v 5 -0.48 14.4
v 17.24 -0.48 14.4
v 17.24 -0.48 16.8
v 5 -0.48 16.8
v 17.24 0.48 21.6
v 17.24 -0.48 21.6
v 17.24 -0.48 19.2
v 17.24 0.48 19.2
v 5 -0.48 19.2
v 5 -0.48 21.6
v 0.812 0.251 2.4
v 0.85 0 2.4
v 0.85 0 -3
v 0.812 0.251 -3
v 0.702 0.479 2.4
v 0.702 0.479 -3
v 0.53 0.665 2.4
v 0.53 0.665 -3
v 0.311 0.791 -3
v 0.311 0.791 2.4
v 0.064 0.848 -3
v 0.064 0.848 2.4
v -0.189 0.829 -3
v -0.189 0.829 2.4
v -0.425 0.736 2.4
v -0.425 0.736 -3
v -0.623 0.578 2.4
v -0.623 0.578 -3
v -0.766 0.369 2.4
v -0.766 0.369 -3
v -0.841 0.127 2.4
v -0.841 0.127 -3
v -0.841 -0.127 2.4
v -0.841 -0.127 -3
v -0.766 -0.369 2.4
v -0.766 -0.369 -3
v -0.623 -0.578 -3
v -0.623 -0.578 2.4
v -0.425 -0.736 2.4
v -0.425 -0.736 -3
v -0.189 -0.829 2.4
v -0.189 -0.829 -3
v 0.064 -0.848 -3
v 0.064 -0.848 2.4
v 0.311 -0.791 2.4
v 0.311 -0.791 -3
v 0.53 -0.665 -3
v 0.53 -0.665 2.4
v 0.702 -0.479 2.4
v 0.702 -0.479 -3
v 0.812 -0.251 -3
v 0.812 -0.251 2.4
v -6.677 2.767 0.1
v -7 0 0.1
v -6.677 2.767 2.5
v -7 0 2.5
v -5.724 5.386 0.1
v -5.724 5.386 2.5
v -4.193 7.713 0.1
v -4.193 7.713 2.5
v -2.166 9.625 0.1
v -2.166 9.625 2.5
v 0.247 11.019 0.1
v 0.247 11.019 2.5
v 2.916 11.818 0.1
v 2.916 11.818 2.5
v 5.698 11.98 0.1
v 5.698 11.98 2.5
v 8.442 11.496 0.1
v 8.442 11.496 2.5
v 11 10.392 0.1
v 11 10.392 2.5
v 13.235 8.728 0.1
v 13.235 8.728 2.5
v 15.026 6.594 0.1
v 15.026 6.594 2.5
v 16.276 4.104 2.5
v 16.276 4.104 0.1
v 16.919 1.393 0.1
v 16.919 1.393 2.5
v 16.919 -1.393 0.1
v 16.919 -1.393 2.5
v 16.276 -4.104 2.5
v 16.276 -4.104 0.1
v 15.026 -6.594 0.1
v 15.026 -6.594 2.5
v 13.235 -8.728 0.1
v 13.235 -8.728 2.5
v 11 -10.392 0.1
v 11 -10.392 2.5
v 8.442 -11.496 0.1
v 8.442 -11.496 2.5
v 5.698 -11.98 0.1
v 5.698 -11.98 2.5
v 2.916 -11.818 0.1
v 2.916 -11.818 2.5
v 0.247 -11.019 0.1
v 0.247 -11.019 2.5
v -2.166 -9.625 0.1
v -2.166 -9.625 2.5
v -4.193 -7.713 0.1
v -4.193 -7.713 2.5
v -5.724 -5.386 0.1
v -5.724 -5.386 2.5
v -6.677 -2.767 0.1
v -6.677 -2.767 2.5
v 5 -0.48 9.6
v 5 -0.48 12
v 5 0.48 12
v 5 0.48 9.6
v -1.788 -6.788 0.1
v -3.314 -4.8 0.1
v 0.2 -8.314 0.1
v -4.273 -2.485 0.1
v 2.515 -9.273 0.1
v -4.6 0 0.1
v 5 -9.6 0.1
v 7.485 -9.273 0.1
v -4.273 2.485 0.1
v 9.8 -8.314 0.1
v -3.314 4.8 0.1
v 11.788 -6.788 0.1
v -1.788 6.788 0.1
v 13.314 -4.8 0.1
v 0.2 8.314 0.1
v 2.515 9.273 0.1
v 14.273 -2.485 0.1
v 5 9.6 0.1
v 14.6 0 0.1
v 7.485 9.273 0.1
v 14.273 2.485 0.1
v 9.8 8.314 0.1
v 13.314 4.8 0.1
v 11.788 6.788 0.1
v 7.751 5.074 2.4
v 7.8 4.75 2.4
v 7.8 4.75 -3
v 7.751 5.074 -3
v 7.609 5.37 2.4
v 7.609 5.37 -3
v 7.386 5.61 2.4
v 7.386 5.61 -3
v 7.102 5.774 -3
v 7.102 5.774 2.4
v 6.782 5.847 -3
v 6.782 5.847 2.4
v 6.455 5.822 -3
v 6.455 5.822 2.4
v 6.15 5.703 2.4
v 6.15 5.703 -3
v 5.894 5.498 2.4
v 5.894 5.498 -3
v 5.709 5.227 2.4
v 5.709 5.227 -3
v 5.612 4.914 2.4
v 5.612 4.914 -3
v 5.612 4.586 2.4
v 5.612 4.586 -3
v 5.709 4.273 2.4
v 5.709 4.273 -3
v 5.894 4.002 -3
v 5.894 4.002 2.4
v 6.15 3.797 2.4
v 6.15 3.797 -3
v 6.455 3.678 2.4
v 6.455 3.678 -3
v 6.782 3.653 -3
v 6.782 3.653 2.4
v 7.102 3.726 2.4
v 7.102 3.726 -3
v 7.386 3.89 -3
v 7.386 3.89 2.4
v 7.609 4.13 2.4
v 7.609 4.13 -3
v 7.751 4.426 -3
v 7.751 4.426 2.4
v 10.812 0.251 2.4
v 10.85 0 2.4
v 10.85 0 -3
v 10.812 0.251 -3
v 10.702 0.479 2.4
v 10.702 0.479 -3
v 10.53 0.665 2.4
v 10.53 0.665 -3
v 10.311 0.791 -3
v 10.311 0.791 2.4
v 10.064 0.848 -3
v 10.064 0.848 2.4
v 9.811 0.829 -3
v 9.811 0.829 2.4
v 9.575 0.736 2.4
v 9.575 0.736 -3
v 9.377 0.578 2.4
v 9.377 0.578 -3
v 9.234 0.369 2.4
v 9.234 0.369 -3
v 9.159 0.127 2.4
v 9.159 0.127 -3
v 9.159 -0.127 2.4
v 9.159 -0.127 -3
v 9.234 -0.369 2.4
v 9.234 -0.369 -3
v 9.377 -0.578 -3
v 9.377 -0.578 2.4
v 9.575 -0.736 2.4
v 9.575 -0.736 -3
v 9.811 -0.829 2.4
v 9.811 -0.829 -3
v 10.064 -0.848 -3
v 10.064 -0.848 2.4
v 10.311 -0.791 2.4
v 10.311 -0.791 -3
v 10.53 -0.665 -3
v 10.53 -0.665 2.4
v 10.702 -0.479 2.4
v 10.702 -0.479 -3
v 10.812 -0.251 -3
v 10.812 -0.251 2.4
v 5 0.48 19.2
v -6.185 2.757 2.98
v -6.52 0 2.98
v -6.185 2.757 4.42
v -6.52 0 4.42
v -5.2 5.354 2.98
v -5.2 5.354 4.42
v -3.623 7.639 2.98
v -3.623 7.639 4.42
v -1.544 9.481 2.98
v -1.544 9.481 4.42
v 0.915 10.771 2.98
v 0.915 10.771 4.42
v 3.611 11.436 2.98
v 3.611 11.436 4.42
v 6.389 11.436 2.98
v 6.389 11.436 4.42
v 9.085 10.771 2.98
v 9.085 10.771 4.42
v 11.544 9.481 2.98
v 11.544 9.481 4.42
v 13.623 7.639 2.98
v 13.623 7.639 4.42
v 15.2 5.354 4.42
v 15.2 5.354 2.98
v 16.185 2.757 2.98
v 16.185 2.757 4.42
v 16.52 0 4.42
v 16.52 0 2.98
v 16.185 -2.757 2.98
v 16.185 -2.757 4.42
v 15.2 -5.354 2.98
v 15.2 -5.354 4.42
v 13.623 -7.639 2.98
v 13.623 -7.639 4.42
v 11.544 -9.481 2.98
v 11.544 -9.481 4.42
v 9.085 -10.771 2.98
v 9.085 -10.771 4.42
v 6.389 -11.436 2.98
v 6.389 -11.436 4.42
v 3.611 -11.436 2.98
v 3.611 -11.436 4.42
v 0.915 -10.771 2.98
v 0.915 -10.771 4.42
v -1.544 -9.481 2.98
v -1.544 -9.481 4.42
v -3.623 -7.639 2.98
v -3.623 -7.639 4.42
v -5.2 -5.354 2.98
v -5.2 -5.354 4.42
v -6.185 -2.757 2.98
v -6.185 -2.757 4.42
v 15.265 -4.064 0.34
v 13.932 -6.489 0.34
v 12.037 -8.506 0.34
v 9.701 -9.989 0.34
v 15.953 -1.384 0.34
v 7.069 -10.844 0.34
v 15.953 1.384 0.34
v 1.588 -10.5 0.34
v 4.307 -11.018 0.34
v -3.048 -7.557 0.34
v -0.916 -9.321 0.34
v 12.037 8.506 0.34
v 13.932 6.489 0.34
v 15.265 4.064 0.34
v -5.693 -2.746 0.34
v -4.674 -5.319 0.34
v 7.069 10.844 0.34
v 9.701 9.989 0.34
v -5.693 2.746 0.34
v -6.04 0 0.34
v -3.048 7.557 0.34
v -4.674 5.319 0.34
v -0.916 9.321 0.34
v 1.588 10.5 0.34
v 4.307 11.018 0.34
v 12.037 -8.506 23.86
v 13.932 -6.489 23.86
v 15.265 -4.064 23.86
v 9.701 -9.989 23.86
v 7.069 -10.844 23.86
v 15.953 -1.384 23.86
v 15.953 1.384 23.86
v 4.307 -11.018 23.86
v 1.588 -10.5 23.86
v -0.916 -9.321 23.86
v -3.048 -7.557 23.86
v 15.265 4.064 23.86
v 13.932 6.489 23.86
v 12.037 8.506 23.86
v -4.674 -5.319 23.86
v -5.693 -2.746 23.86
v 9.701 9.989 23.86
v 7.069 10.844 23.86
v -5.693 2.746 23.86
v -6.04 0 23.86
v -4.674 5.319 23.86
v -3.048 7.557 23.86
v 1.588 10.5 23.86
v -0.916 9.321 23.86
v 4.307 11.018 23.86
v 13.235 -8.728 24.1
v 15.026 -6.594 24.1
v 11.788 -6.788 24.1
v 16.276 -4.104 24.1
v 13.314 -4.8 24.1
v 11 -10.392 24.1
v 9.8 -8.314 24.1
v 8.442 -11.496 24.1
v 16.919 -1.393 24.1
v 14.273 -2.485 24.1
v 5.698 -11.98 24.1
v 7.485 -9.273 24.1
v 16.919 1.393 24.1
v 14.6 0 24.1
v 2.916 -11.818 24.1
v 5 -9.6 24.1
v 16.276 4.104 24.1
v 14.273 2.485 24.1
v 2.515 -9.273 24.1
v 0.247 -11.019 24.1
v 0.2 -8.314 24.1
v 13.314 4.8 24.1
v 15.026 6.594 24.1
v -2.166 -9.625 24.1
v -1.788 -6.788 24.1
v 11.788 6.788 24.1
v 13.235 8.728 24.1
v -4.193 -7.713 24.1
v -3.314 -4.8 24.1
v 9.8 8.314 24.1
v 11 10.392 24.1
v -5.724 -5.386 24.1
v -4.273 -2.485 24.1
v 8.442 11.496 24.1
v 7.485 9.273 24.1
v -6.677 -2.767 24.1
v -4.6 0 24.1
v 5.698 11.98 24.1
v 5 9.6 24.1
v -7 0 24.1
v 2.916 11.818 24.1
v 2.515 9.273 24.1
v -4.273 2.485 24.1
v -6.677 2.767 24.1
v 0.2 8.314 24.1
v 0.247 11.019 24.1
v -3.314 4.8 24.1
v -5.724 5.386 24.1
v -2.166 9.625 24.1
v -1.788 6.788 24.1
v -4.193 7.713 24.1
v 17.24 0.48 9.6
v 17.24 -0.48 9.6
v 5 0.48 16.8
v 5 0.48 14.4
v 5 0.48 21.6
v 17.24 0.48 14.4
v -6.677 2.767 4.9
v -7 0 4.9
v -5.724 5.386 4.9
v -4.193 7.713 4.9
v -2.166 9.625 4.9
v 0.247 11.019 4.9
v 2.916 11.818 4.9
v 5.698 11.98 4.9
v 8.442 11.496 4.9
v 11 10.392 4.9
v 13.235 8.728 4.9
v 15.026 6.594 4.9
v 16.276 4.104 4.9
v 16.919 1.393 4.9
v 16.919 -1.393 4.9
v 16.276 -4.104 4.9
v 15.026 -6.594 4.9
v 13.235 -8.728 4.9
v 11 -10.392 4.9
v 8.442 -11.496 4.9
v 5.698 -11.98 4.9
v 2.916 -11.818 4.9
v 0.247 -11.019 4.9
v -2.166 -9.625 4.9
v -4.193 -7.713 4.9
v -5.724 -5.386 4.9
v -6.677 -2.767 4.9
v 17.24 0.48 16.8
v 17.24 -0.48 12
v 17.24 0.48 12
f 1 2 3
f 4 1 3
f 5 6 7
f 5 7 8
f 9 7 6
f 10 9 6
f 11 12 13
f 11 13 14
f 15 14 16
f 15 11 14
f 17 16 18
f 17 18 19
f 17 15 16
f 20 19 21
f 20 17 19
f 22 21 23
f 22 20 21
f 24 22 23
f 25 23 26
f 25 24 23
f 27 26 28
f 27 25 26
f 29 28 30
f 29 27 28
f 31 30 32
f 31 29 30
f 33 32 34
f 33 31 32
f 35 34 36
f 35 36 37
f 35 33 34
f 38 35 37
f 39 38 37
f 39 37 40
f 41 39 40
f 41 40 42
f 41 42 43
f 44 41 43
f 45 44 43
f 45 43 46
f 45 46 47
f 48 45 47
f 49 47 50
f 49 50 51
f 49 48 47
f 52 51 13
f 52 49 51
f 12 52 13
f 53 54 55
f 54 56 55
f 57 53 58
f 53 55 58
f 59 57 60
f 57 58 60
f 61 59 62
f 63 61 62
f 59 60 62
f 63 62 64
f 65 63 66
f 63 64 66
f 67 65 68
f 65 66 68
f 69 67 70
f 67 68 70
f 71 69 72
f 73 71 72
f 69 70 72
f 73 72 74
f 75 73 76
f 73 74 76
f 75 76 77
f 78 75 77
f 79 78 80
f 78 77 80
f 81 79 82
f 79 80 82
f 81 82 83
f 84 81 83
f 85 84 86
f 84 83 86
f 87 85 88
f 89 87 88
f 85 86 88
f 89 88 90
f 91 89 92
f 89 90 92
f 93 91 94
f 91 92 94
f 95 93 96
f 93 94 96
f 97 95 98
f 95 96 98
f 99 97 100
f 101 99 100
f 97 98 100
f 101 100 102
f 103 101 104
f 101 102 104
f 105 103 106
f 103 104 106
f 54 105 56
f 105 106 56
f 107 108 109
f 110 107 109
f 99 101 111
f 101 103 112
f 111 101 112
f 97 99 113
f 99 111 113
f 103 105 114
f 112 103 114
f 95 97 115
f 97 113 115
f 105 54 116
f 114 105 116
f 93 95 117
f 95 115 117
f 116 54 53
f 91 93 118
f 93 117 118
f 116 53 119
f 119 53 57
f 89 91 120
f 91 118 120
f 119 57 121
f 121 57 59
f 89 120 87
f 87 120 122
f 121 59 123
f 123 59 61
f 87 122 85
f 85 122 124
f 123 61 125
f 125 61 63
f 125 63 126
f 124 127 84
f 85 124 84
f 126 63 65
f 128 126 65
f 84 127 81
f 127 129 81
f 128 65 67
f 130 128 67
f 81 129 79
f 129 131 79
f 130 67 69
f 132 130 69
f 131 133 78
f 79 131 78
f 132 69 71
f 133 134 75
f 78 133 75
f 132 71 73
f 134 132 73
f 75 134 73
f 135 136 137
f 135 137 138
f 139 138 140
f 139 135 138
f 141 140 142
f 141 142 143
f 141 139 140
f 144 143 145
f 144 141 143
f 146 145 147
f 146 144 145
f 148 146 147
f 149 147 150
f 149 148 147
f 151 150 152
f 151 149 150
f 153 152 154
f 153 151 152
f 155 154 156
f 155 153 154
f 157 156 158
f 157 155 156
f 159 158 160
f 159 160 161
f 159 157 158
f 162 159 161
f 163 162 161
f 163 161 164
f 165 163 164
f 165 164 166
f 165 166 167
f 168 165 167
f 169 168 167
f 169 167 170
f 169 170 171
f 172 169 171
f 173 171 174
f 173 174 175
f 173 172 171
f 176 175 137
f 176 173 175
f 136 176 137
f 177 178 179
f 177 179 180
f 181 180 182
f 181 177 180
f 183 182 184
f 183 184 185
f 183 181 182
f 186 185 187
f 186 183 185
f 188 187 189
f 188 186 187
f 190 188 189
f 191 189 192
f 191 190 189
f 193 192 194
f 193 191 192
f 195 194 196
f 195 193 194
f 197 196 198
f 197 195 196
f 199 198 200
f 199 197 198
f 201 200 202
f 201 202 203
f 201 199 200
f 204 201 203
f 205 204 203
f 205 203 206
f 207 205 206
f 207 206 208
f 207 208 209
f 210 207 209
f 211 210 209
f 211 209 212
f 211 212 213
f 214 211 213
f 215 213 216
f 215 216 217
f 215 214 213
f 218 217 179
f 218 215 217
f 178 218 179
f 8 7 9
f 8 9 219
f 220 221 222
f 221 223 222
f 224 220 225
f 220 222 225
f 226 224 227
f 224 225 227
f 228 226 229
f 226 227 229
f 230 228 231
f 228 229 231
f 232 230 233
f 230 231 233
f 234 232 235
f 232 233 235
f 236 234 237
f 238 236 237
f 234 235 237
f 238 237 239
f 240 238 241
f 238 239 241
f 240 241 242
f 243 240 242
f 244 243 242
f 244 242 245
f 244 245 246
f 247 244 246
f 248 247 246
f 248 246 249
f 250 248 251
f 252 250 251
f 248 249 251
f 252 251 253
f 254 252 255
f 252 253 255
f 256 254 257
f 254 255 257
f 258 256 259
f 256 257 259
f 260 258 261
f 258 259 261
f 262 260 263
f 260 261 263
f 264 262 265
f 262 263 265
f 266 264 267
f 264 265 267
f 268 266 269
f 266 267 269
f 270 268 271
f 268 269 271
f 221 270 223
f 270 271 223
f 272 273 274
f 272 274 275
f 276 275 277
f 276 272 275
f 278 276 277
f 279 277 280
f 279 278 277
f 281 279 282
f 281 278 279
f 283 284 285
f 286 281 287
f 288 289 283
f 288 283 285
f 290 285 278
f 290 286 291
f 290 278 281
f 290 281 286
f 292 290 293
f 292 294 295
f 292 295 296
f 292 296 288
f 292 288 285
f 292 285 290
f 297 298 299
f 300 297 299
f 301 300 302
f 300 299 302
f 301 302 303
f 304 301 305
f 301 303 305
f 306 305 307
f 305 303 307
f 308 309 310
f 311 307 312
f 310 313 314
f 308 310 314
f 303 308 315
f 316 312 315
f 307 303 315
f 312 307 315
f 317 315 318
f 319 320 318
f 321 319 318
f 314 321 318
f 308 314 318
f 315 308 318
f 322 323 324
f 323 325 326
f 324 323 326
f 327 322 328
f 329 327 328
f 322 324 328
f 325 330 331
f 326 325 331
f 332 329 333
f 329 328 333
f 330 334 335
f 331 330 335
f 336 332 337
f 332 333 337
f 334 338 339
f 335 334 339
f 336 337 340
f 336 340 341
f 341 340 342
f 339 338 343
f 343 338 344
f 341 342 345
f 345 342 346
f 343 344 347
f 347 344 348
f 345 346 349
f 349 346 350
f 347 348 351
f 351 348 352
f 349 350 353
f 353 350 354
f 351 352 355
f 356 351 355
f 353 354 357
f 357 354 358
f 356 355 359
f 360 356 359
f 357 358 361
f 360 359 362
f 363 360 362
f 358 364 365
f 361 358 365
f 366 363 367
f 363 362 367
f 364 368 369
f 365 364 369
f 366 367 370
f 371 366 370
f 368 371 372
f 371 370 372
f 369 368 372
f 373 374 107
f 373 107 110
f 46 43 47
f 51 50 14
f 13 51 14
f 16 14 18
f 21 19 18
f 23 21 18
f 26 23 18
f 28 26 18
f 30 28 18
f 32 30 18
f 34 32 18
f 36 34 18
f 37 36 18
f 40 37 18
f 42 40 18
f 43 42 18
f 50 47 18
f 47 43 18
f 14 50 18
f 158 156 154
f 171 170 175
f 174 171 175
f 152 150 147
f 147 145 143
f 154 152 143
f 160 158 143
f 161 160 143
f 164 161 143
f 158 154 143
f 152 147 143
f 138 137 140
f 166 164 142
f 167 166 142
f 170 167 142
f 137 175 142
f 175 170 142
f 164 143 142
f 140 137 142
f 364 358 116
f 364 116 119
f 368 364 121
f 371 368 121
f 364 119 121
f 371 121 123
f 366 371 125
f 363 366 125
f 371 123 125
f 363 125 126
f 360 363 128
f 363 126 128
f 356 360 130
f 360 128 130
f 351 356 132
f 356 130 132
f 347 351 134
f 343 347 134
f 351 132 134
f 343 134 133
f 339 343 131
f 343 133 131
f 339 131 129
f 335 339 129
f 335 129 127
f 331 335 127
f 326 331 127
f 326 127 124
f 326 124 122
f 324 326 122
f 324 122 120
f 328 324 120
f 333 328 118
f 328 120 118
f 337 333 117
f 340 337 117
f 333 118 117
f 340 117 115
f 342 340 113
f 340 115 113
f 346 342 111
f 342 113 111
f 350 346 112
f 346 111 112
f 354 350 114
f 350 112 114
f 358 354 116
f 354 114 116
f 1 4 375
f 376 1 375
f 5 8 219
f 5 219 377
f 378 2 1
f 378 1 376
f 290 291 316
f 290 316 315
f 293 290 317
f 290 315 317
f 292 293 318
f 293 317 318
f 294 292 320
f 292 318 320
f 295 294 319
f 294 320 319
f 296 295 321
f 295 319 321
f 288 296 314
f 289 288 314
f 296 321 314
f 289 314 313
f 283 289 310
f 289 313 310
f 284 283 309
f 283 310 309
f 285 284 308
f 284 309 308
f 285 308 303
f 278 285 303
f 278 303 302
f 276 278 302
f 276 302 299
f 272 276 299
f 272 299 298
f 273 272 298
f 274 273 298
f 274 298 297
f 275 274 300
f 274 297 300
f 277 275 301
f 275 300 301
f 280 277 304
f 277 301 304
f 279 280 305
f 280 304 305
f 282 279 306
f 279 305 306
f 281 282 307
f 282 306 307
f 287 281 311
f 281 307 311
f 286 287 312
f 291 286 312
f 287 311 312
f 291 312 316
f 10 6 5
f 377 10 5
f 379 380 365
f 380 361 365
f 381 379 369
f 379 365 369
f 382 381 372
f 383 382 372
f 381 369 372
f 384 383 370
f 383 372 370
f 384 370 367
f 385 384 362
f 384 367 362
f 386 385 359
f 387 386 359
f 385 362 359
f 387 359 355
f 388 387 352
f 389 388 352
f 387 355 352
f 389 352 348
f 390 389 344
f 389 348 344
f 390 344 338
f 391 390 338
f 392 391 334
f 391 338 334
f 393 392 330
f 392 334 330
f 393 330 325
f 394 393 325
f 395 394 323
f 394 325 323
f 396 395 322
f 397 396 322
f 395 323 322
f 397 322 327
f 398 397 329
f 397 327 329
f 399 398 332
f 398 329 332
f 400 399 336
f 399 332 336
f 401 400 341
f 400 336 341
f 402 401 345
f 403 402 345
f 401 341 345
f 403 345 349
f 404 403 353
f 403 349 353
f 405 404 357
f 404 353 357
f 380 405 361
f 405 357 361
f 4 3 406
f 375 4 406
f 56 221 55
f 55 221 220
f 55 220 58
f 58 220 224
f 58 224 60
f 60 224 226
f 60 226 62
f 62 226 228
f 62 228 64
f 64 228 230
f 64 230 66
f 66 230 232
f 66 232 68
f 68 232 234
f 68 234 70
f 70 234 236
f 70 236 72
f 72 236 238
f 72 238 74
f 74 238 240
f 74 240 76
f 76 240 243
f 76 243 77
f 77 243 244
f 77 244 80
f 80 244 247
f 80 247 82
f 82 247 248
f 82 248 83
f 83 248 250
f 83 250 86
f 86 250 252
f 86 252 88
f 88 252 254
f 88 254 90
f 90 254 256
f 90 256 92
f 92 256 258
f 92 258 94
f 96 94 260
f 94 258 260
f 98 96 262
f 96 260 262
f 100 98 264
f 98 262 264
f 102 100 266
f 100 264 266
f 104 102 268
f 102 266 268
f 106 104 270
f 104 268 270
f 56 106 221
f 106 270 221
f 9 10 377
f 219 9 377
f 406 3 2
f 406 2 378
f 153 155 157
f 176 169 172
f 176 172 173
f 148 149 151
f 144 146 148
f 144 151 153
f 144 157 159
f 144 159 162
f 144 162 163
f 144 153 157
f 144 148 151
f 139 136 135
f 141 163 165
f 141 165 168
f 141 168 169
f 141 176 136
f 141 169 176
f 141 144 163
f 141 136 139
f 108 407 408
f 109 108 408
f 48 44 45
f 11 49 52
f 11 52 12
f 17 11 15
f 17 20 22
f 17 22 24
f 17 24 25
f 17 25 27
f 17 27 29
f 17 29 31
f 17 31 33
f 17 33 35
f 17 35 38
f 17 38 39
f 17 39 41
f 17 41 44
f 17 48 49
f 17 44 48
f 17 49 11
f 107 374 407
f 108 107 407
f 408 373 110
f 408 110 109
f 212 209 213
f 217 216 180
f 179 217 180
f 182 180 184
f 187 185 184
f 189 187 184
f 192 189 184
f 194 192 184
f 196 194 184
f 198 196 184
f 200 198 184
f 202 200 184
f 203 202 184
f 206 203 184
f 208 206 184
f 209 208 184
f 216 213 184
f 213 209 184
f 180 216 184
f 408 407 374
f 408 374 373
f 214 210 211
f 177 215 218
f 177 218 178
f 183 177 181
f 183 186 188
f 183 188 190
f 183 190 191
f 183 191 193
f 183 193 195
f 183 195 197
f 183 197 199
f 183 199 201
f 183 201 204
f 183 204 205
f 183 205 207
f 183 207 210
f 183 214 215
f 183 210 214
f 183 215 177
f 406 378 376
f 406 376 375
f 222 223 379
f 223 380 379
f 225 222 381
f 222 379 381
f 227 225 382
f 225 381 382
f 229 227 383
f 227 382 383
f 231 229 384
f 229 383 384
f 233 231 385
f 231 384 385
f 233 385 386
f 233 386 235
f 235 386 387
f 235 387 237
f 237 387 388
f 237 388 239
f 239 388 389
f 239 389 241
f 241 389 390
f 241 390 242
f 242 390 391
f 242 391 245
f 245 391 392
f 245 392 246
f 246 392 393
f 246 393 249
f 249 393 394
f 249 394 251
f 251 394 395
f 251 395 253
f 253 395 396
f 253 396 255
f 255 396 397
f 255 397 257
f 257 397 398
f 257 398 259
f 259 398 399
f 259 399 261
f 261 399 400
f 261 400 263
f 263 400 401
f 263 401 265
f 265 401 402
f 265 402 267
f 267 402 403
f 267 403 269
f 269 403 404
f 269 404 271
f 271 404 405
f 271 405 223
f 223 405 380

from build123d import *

# Parameters (mm, degrees)
SKETCH002_W   = 11.04
SKETCH002_H   = 23.52
SKETCH003_R   = 0.85
SKETCH003_R_2 = 1.1
PAD_DEPTH     = 5.4
SKETCH004_W   = 0.96
SKETCH004_H   = 2.4
PAD001_DEPTH  = 12.24


with BuildPart() as revolution:
    # Sketch → Revolution (revolve)
    with BuildSketch(Plane.XZ):
        Polygon((-7, 0.1), (-7, 2.5), (-6.52, 2.98), (-6.52, 4.42), (-7, 4.9), (-7, 24.1), (-4.6, 24.1), (-4.6, 0.1), align=None)
    revolve(axis=Axis((5, 0, 7.548619), (0, 0, -1)))


with BuildPart() as revolution001:
    # Sketch002 → Revolution001 (revolve)
    with BuildSketch(Plane.XZ):
        with Locations((-0.52, 12.1)):
            Rectangle(SKETCH002_W, SKETCH002_H)
    revolve(axis=Axis((5, 0, 4.680116), (0, 0, -1)))


with BuildPart() as pad:
    # Sketch003 → Pad (new body)
    with BuildSketch(Plane.XY.offset(2.4)):
        Circle(SKETCH003_R)
        with Locations((10, 0)):
            Circle(SKETCH003_R)
        with Locations((6.7, 4.75)):
            Circle(SKETCH003_R_2)
    extrude(amount=-PAD_DEPTH)


with BuildPart() as pad001:
    # Sketch004 → Pad001 (new body)
    with BuildSketch(Plane.YZ.offset(5)):
        with Locations((0, 10.8)):
            Rectangle(SKETCH004_W, SKETCH004_H)
        with Locations((0, 15.6)):
            Rectangle(SKETCH004_W, SKETCH004_H)
        with Locations((0, 20.4)):
            Rectangle(SKETCH004_W, SKETCH004_H)
    extrude(amount=PAD001_DEPTH)


solid = Compound([revolution.part, revolution001.part, pad.part, pad001.part])
